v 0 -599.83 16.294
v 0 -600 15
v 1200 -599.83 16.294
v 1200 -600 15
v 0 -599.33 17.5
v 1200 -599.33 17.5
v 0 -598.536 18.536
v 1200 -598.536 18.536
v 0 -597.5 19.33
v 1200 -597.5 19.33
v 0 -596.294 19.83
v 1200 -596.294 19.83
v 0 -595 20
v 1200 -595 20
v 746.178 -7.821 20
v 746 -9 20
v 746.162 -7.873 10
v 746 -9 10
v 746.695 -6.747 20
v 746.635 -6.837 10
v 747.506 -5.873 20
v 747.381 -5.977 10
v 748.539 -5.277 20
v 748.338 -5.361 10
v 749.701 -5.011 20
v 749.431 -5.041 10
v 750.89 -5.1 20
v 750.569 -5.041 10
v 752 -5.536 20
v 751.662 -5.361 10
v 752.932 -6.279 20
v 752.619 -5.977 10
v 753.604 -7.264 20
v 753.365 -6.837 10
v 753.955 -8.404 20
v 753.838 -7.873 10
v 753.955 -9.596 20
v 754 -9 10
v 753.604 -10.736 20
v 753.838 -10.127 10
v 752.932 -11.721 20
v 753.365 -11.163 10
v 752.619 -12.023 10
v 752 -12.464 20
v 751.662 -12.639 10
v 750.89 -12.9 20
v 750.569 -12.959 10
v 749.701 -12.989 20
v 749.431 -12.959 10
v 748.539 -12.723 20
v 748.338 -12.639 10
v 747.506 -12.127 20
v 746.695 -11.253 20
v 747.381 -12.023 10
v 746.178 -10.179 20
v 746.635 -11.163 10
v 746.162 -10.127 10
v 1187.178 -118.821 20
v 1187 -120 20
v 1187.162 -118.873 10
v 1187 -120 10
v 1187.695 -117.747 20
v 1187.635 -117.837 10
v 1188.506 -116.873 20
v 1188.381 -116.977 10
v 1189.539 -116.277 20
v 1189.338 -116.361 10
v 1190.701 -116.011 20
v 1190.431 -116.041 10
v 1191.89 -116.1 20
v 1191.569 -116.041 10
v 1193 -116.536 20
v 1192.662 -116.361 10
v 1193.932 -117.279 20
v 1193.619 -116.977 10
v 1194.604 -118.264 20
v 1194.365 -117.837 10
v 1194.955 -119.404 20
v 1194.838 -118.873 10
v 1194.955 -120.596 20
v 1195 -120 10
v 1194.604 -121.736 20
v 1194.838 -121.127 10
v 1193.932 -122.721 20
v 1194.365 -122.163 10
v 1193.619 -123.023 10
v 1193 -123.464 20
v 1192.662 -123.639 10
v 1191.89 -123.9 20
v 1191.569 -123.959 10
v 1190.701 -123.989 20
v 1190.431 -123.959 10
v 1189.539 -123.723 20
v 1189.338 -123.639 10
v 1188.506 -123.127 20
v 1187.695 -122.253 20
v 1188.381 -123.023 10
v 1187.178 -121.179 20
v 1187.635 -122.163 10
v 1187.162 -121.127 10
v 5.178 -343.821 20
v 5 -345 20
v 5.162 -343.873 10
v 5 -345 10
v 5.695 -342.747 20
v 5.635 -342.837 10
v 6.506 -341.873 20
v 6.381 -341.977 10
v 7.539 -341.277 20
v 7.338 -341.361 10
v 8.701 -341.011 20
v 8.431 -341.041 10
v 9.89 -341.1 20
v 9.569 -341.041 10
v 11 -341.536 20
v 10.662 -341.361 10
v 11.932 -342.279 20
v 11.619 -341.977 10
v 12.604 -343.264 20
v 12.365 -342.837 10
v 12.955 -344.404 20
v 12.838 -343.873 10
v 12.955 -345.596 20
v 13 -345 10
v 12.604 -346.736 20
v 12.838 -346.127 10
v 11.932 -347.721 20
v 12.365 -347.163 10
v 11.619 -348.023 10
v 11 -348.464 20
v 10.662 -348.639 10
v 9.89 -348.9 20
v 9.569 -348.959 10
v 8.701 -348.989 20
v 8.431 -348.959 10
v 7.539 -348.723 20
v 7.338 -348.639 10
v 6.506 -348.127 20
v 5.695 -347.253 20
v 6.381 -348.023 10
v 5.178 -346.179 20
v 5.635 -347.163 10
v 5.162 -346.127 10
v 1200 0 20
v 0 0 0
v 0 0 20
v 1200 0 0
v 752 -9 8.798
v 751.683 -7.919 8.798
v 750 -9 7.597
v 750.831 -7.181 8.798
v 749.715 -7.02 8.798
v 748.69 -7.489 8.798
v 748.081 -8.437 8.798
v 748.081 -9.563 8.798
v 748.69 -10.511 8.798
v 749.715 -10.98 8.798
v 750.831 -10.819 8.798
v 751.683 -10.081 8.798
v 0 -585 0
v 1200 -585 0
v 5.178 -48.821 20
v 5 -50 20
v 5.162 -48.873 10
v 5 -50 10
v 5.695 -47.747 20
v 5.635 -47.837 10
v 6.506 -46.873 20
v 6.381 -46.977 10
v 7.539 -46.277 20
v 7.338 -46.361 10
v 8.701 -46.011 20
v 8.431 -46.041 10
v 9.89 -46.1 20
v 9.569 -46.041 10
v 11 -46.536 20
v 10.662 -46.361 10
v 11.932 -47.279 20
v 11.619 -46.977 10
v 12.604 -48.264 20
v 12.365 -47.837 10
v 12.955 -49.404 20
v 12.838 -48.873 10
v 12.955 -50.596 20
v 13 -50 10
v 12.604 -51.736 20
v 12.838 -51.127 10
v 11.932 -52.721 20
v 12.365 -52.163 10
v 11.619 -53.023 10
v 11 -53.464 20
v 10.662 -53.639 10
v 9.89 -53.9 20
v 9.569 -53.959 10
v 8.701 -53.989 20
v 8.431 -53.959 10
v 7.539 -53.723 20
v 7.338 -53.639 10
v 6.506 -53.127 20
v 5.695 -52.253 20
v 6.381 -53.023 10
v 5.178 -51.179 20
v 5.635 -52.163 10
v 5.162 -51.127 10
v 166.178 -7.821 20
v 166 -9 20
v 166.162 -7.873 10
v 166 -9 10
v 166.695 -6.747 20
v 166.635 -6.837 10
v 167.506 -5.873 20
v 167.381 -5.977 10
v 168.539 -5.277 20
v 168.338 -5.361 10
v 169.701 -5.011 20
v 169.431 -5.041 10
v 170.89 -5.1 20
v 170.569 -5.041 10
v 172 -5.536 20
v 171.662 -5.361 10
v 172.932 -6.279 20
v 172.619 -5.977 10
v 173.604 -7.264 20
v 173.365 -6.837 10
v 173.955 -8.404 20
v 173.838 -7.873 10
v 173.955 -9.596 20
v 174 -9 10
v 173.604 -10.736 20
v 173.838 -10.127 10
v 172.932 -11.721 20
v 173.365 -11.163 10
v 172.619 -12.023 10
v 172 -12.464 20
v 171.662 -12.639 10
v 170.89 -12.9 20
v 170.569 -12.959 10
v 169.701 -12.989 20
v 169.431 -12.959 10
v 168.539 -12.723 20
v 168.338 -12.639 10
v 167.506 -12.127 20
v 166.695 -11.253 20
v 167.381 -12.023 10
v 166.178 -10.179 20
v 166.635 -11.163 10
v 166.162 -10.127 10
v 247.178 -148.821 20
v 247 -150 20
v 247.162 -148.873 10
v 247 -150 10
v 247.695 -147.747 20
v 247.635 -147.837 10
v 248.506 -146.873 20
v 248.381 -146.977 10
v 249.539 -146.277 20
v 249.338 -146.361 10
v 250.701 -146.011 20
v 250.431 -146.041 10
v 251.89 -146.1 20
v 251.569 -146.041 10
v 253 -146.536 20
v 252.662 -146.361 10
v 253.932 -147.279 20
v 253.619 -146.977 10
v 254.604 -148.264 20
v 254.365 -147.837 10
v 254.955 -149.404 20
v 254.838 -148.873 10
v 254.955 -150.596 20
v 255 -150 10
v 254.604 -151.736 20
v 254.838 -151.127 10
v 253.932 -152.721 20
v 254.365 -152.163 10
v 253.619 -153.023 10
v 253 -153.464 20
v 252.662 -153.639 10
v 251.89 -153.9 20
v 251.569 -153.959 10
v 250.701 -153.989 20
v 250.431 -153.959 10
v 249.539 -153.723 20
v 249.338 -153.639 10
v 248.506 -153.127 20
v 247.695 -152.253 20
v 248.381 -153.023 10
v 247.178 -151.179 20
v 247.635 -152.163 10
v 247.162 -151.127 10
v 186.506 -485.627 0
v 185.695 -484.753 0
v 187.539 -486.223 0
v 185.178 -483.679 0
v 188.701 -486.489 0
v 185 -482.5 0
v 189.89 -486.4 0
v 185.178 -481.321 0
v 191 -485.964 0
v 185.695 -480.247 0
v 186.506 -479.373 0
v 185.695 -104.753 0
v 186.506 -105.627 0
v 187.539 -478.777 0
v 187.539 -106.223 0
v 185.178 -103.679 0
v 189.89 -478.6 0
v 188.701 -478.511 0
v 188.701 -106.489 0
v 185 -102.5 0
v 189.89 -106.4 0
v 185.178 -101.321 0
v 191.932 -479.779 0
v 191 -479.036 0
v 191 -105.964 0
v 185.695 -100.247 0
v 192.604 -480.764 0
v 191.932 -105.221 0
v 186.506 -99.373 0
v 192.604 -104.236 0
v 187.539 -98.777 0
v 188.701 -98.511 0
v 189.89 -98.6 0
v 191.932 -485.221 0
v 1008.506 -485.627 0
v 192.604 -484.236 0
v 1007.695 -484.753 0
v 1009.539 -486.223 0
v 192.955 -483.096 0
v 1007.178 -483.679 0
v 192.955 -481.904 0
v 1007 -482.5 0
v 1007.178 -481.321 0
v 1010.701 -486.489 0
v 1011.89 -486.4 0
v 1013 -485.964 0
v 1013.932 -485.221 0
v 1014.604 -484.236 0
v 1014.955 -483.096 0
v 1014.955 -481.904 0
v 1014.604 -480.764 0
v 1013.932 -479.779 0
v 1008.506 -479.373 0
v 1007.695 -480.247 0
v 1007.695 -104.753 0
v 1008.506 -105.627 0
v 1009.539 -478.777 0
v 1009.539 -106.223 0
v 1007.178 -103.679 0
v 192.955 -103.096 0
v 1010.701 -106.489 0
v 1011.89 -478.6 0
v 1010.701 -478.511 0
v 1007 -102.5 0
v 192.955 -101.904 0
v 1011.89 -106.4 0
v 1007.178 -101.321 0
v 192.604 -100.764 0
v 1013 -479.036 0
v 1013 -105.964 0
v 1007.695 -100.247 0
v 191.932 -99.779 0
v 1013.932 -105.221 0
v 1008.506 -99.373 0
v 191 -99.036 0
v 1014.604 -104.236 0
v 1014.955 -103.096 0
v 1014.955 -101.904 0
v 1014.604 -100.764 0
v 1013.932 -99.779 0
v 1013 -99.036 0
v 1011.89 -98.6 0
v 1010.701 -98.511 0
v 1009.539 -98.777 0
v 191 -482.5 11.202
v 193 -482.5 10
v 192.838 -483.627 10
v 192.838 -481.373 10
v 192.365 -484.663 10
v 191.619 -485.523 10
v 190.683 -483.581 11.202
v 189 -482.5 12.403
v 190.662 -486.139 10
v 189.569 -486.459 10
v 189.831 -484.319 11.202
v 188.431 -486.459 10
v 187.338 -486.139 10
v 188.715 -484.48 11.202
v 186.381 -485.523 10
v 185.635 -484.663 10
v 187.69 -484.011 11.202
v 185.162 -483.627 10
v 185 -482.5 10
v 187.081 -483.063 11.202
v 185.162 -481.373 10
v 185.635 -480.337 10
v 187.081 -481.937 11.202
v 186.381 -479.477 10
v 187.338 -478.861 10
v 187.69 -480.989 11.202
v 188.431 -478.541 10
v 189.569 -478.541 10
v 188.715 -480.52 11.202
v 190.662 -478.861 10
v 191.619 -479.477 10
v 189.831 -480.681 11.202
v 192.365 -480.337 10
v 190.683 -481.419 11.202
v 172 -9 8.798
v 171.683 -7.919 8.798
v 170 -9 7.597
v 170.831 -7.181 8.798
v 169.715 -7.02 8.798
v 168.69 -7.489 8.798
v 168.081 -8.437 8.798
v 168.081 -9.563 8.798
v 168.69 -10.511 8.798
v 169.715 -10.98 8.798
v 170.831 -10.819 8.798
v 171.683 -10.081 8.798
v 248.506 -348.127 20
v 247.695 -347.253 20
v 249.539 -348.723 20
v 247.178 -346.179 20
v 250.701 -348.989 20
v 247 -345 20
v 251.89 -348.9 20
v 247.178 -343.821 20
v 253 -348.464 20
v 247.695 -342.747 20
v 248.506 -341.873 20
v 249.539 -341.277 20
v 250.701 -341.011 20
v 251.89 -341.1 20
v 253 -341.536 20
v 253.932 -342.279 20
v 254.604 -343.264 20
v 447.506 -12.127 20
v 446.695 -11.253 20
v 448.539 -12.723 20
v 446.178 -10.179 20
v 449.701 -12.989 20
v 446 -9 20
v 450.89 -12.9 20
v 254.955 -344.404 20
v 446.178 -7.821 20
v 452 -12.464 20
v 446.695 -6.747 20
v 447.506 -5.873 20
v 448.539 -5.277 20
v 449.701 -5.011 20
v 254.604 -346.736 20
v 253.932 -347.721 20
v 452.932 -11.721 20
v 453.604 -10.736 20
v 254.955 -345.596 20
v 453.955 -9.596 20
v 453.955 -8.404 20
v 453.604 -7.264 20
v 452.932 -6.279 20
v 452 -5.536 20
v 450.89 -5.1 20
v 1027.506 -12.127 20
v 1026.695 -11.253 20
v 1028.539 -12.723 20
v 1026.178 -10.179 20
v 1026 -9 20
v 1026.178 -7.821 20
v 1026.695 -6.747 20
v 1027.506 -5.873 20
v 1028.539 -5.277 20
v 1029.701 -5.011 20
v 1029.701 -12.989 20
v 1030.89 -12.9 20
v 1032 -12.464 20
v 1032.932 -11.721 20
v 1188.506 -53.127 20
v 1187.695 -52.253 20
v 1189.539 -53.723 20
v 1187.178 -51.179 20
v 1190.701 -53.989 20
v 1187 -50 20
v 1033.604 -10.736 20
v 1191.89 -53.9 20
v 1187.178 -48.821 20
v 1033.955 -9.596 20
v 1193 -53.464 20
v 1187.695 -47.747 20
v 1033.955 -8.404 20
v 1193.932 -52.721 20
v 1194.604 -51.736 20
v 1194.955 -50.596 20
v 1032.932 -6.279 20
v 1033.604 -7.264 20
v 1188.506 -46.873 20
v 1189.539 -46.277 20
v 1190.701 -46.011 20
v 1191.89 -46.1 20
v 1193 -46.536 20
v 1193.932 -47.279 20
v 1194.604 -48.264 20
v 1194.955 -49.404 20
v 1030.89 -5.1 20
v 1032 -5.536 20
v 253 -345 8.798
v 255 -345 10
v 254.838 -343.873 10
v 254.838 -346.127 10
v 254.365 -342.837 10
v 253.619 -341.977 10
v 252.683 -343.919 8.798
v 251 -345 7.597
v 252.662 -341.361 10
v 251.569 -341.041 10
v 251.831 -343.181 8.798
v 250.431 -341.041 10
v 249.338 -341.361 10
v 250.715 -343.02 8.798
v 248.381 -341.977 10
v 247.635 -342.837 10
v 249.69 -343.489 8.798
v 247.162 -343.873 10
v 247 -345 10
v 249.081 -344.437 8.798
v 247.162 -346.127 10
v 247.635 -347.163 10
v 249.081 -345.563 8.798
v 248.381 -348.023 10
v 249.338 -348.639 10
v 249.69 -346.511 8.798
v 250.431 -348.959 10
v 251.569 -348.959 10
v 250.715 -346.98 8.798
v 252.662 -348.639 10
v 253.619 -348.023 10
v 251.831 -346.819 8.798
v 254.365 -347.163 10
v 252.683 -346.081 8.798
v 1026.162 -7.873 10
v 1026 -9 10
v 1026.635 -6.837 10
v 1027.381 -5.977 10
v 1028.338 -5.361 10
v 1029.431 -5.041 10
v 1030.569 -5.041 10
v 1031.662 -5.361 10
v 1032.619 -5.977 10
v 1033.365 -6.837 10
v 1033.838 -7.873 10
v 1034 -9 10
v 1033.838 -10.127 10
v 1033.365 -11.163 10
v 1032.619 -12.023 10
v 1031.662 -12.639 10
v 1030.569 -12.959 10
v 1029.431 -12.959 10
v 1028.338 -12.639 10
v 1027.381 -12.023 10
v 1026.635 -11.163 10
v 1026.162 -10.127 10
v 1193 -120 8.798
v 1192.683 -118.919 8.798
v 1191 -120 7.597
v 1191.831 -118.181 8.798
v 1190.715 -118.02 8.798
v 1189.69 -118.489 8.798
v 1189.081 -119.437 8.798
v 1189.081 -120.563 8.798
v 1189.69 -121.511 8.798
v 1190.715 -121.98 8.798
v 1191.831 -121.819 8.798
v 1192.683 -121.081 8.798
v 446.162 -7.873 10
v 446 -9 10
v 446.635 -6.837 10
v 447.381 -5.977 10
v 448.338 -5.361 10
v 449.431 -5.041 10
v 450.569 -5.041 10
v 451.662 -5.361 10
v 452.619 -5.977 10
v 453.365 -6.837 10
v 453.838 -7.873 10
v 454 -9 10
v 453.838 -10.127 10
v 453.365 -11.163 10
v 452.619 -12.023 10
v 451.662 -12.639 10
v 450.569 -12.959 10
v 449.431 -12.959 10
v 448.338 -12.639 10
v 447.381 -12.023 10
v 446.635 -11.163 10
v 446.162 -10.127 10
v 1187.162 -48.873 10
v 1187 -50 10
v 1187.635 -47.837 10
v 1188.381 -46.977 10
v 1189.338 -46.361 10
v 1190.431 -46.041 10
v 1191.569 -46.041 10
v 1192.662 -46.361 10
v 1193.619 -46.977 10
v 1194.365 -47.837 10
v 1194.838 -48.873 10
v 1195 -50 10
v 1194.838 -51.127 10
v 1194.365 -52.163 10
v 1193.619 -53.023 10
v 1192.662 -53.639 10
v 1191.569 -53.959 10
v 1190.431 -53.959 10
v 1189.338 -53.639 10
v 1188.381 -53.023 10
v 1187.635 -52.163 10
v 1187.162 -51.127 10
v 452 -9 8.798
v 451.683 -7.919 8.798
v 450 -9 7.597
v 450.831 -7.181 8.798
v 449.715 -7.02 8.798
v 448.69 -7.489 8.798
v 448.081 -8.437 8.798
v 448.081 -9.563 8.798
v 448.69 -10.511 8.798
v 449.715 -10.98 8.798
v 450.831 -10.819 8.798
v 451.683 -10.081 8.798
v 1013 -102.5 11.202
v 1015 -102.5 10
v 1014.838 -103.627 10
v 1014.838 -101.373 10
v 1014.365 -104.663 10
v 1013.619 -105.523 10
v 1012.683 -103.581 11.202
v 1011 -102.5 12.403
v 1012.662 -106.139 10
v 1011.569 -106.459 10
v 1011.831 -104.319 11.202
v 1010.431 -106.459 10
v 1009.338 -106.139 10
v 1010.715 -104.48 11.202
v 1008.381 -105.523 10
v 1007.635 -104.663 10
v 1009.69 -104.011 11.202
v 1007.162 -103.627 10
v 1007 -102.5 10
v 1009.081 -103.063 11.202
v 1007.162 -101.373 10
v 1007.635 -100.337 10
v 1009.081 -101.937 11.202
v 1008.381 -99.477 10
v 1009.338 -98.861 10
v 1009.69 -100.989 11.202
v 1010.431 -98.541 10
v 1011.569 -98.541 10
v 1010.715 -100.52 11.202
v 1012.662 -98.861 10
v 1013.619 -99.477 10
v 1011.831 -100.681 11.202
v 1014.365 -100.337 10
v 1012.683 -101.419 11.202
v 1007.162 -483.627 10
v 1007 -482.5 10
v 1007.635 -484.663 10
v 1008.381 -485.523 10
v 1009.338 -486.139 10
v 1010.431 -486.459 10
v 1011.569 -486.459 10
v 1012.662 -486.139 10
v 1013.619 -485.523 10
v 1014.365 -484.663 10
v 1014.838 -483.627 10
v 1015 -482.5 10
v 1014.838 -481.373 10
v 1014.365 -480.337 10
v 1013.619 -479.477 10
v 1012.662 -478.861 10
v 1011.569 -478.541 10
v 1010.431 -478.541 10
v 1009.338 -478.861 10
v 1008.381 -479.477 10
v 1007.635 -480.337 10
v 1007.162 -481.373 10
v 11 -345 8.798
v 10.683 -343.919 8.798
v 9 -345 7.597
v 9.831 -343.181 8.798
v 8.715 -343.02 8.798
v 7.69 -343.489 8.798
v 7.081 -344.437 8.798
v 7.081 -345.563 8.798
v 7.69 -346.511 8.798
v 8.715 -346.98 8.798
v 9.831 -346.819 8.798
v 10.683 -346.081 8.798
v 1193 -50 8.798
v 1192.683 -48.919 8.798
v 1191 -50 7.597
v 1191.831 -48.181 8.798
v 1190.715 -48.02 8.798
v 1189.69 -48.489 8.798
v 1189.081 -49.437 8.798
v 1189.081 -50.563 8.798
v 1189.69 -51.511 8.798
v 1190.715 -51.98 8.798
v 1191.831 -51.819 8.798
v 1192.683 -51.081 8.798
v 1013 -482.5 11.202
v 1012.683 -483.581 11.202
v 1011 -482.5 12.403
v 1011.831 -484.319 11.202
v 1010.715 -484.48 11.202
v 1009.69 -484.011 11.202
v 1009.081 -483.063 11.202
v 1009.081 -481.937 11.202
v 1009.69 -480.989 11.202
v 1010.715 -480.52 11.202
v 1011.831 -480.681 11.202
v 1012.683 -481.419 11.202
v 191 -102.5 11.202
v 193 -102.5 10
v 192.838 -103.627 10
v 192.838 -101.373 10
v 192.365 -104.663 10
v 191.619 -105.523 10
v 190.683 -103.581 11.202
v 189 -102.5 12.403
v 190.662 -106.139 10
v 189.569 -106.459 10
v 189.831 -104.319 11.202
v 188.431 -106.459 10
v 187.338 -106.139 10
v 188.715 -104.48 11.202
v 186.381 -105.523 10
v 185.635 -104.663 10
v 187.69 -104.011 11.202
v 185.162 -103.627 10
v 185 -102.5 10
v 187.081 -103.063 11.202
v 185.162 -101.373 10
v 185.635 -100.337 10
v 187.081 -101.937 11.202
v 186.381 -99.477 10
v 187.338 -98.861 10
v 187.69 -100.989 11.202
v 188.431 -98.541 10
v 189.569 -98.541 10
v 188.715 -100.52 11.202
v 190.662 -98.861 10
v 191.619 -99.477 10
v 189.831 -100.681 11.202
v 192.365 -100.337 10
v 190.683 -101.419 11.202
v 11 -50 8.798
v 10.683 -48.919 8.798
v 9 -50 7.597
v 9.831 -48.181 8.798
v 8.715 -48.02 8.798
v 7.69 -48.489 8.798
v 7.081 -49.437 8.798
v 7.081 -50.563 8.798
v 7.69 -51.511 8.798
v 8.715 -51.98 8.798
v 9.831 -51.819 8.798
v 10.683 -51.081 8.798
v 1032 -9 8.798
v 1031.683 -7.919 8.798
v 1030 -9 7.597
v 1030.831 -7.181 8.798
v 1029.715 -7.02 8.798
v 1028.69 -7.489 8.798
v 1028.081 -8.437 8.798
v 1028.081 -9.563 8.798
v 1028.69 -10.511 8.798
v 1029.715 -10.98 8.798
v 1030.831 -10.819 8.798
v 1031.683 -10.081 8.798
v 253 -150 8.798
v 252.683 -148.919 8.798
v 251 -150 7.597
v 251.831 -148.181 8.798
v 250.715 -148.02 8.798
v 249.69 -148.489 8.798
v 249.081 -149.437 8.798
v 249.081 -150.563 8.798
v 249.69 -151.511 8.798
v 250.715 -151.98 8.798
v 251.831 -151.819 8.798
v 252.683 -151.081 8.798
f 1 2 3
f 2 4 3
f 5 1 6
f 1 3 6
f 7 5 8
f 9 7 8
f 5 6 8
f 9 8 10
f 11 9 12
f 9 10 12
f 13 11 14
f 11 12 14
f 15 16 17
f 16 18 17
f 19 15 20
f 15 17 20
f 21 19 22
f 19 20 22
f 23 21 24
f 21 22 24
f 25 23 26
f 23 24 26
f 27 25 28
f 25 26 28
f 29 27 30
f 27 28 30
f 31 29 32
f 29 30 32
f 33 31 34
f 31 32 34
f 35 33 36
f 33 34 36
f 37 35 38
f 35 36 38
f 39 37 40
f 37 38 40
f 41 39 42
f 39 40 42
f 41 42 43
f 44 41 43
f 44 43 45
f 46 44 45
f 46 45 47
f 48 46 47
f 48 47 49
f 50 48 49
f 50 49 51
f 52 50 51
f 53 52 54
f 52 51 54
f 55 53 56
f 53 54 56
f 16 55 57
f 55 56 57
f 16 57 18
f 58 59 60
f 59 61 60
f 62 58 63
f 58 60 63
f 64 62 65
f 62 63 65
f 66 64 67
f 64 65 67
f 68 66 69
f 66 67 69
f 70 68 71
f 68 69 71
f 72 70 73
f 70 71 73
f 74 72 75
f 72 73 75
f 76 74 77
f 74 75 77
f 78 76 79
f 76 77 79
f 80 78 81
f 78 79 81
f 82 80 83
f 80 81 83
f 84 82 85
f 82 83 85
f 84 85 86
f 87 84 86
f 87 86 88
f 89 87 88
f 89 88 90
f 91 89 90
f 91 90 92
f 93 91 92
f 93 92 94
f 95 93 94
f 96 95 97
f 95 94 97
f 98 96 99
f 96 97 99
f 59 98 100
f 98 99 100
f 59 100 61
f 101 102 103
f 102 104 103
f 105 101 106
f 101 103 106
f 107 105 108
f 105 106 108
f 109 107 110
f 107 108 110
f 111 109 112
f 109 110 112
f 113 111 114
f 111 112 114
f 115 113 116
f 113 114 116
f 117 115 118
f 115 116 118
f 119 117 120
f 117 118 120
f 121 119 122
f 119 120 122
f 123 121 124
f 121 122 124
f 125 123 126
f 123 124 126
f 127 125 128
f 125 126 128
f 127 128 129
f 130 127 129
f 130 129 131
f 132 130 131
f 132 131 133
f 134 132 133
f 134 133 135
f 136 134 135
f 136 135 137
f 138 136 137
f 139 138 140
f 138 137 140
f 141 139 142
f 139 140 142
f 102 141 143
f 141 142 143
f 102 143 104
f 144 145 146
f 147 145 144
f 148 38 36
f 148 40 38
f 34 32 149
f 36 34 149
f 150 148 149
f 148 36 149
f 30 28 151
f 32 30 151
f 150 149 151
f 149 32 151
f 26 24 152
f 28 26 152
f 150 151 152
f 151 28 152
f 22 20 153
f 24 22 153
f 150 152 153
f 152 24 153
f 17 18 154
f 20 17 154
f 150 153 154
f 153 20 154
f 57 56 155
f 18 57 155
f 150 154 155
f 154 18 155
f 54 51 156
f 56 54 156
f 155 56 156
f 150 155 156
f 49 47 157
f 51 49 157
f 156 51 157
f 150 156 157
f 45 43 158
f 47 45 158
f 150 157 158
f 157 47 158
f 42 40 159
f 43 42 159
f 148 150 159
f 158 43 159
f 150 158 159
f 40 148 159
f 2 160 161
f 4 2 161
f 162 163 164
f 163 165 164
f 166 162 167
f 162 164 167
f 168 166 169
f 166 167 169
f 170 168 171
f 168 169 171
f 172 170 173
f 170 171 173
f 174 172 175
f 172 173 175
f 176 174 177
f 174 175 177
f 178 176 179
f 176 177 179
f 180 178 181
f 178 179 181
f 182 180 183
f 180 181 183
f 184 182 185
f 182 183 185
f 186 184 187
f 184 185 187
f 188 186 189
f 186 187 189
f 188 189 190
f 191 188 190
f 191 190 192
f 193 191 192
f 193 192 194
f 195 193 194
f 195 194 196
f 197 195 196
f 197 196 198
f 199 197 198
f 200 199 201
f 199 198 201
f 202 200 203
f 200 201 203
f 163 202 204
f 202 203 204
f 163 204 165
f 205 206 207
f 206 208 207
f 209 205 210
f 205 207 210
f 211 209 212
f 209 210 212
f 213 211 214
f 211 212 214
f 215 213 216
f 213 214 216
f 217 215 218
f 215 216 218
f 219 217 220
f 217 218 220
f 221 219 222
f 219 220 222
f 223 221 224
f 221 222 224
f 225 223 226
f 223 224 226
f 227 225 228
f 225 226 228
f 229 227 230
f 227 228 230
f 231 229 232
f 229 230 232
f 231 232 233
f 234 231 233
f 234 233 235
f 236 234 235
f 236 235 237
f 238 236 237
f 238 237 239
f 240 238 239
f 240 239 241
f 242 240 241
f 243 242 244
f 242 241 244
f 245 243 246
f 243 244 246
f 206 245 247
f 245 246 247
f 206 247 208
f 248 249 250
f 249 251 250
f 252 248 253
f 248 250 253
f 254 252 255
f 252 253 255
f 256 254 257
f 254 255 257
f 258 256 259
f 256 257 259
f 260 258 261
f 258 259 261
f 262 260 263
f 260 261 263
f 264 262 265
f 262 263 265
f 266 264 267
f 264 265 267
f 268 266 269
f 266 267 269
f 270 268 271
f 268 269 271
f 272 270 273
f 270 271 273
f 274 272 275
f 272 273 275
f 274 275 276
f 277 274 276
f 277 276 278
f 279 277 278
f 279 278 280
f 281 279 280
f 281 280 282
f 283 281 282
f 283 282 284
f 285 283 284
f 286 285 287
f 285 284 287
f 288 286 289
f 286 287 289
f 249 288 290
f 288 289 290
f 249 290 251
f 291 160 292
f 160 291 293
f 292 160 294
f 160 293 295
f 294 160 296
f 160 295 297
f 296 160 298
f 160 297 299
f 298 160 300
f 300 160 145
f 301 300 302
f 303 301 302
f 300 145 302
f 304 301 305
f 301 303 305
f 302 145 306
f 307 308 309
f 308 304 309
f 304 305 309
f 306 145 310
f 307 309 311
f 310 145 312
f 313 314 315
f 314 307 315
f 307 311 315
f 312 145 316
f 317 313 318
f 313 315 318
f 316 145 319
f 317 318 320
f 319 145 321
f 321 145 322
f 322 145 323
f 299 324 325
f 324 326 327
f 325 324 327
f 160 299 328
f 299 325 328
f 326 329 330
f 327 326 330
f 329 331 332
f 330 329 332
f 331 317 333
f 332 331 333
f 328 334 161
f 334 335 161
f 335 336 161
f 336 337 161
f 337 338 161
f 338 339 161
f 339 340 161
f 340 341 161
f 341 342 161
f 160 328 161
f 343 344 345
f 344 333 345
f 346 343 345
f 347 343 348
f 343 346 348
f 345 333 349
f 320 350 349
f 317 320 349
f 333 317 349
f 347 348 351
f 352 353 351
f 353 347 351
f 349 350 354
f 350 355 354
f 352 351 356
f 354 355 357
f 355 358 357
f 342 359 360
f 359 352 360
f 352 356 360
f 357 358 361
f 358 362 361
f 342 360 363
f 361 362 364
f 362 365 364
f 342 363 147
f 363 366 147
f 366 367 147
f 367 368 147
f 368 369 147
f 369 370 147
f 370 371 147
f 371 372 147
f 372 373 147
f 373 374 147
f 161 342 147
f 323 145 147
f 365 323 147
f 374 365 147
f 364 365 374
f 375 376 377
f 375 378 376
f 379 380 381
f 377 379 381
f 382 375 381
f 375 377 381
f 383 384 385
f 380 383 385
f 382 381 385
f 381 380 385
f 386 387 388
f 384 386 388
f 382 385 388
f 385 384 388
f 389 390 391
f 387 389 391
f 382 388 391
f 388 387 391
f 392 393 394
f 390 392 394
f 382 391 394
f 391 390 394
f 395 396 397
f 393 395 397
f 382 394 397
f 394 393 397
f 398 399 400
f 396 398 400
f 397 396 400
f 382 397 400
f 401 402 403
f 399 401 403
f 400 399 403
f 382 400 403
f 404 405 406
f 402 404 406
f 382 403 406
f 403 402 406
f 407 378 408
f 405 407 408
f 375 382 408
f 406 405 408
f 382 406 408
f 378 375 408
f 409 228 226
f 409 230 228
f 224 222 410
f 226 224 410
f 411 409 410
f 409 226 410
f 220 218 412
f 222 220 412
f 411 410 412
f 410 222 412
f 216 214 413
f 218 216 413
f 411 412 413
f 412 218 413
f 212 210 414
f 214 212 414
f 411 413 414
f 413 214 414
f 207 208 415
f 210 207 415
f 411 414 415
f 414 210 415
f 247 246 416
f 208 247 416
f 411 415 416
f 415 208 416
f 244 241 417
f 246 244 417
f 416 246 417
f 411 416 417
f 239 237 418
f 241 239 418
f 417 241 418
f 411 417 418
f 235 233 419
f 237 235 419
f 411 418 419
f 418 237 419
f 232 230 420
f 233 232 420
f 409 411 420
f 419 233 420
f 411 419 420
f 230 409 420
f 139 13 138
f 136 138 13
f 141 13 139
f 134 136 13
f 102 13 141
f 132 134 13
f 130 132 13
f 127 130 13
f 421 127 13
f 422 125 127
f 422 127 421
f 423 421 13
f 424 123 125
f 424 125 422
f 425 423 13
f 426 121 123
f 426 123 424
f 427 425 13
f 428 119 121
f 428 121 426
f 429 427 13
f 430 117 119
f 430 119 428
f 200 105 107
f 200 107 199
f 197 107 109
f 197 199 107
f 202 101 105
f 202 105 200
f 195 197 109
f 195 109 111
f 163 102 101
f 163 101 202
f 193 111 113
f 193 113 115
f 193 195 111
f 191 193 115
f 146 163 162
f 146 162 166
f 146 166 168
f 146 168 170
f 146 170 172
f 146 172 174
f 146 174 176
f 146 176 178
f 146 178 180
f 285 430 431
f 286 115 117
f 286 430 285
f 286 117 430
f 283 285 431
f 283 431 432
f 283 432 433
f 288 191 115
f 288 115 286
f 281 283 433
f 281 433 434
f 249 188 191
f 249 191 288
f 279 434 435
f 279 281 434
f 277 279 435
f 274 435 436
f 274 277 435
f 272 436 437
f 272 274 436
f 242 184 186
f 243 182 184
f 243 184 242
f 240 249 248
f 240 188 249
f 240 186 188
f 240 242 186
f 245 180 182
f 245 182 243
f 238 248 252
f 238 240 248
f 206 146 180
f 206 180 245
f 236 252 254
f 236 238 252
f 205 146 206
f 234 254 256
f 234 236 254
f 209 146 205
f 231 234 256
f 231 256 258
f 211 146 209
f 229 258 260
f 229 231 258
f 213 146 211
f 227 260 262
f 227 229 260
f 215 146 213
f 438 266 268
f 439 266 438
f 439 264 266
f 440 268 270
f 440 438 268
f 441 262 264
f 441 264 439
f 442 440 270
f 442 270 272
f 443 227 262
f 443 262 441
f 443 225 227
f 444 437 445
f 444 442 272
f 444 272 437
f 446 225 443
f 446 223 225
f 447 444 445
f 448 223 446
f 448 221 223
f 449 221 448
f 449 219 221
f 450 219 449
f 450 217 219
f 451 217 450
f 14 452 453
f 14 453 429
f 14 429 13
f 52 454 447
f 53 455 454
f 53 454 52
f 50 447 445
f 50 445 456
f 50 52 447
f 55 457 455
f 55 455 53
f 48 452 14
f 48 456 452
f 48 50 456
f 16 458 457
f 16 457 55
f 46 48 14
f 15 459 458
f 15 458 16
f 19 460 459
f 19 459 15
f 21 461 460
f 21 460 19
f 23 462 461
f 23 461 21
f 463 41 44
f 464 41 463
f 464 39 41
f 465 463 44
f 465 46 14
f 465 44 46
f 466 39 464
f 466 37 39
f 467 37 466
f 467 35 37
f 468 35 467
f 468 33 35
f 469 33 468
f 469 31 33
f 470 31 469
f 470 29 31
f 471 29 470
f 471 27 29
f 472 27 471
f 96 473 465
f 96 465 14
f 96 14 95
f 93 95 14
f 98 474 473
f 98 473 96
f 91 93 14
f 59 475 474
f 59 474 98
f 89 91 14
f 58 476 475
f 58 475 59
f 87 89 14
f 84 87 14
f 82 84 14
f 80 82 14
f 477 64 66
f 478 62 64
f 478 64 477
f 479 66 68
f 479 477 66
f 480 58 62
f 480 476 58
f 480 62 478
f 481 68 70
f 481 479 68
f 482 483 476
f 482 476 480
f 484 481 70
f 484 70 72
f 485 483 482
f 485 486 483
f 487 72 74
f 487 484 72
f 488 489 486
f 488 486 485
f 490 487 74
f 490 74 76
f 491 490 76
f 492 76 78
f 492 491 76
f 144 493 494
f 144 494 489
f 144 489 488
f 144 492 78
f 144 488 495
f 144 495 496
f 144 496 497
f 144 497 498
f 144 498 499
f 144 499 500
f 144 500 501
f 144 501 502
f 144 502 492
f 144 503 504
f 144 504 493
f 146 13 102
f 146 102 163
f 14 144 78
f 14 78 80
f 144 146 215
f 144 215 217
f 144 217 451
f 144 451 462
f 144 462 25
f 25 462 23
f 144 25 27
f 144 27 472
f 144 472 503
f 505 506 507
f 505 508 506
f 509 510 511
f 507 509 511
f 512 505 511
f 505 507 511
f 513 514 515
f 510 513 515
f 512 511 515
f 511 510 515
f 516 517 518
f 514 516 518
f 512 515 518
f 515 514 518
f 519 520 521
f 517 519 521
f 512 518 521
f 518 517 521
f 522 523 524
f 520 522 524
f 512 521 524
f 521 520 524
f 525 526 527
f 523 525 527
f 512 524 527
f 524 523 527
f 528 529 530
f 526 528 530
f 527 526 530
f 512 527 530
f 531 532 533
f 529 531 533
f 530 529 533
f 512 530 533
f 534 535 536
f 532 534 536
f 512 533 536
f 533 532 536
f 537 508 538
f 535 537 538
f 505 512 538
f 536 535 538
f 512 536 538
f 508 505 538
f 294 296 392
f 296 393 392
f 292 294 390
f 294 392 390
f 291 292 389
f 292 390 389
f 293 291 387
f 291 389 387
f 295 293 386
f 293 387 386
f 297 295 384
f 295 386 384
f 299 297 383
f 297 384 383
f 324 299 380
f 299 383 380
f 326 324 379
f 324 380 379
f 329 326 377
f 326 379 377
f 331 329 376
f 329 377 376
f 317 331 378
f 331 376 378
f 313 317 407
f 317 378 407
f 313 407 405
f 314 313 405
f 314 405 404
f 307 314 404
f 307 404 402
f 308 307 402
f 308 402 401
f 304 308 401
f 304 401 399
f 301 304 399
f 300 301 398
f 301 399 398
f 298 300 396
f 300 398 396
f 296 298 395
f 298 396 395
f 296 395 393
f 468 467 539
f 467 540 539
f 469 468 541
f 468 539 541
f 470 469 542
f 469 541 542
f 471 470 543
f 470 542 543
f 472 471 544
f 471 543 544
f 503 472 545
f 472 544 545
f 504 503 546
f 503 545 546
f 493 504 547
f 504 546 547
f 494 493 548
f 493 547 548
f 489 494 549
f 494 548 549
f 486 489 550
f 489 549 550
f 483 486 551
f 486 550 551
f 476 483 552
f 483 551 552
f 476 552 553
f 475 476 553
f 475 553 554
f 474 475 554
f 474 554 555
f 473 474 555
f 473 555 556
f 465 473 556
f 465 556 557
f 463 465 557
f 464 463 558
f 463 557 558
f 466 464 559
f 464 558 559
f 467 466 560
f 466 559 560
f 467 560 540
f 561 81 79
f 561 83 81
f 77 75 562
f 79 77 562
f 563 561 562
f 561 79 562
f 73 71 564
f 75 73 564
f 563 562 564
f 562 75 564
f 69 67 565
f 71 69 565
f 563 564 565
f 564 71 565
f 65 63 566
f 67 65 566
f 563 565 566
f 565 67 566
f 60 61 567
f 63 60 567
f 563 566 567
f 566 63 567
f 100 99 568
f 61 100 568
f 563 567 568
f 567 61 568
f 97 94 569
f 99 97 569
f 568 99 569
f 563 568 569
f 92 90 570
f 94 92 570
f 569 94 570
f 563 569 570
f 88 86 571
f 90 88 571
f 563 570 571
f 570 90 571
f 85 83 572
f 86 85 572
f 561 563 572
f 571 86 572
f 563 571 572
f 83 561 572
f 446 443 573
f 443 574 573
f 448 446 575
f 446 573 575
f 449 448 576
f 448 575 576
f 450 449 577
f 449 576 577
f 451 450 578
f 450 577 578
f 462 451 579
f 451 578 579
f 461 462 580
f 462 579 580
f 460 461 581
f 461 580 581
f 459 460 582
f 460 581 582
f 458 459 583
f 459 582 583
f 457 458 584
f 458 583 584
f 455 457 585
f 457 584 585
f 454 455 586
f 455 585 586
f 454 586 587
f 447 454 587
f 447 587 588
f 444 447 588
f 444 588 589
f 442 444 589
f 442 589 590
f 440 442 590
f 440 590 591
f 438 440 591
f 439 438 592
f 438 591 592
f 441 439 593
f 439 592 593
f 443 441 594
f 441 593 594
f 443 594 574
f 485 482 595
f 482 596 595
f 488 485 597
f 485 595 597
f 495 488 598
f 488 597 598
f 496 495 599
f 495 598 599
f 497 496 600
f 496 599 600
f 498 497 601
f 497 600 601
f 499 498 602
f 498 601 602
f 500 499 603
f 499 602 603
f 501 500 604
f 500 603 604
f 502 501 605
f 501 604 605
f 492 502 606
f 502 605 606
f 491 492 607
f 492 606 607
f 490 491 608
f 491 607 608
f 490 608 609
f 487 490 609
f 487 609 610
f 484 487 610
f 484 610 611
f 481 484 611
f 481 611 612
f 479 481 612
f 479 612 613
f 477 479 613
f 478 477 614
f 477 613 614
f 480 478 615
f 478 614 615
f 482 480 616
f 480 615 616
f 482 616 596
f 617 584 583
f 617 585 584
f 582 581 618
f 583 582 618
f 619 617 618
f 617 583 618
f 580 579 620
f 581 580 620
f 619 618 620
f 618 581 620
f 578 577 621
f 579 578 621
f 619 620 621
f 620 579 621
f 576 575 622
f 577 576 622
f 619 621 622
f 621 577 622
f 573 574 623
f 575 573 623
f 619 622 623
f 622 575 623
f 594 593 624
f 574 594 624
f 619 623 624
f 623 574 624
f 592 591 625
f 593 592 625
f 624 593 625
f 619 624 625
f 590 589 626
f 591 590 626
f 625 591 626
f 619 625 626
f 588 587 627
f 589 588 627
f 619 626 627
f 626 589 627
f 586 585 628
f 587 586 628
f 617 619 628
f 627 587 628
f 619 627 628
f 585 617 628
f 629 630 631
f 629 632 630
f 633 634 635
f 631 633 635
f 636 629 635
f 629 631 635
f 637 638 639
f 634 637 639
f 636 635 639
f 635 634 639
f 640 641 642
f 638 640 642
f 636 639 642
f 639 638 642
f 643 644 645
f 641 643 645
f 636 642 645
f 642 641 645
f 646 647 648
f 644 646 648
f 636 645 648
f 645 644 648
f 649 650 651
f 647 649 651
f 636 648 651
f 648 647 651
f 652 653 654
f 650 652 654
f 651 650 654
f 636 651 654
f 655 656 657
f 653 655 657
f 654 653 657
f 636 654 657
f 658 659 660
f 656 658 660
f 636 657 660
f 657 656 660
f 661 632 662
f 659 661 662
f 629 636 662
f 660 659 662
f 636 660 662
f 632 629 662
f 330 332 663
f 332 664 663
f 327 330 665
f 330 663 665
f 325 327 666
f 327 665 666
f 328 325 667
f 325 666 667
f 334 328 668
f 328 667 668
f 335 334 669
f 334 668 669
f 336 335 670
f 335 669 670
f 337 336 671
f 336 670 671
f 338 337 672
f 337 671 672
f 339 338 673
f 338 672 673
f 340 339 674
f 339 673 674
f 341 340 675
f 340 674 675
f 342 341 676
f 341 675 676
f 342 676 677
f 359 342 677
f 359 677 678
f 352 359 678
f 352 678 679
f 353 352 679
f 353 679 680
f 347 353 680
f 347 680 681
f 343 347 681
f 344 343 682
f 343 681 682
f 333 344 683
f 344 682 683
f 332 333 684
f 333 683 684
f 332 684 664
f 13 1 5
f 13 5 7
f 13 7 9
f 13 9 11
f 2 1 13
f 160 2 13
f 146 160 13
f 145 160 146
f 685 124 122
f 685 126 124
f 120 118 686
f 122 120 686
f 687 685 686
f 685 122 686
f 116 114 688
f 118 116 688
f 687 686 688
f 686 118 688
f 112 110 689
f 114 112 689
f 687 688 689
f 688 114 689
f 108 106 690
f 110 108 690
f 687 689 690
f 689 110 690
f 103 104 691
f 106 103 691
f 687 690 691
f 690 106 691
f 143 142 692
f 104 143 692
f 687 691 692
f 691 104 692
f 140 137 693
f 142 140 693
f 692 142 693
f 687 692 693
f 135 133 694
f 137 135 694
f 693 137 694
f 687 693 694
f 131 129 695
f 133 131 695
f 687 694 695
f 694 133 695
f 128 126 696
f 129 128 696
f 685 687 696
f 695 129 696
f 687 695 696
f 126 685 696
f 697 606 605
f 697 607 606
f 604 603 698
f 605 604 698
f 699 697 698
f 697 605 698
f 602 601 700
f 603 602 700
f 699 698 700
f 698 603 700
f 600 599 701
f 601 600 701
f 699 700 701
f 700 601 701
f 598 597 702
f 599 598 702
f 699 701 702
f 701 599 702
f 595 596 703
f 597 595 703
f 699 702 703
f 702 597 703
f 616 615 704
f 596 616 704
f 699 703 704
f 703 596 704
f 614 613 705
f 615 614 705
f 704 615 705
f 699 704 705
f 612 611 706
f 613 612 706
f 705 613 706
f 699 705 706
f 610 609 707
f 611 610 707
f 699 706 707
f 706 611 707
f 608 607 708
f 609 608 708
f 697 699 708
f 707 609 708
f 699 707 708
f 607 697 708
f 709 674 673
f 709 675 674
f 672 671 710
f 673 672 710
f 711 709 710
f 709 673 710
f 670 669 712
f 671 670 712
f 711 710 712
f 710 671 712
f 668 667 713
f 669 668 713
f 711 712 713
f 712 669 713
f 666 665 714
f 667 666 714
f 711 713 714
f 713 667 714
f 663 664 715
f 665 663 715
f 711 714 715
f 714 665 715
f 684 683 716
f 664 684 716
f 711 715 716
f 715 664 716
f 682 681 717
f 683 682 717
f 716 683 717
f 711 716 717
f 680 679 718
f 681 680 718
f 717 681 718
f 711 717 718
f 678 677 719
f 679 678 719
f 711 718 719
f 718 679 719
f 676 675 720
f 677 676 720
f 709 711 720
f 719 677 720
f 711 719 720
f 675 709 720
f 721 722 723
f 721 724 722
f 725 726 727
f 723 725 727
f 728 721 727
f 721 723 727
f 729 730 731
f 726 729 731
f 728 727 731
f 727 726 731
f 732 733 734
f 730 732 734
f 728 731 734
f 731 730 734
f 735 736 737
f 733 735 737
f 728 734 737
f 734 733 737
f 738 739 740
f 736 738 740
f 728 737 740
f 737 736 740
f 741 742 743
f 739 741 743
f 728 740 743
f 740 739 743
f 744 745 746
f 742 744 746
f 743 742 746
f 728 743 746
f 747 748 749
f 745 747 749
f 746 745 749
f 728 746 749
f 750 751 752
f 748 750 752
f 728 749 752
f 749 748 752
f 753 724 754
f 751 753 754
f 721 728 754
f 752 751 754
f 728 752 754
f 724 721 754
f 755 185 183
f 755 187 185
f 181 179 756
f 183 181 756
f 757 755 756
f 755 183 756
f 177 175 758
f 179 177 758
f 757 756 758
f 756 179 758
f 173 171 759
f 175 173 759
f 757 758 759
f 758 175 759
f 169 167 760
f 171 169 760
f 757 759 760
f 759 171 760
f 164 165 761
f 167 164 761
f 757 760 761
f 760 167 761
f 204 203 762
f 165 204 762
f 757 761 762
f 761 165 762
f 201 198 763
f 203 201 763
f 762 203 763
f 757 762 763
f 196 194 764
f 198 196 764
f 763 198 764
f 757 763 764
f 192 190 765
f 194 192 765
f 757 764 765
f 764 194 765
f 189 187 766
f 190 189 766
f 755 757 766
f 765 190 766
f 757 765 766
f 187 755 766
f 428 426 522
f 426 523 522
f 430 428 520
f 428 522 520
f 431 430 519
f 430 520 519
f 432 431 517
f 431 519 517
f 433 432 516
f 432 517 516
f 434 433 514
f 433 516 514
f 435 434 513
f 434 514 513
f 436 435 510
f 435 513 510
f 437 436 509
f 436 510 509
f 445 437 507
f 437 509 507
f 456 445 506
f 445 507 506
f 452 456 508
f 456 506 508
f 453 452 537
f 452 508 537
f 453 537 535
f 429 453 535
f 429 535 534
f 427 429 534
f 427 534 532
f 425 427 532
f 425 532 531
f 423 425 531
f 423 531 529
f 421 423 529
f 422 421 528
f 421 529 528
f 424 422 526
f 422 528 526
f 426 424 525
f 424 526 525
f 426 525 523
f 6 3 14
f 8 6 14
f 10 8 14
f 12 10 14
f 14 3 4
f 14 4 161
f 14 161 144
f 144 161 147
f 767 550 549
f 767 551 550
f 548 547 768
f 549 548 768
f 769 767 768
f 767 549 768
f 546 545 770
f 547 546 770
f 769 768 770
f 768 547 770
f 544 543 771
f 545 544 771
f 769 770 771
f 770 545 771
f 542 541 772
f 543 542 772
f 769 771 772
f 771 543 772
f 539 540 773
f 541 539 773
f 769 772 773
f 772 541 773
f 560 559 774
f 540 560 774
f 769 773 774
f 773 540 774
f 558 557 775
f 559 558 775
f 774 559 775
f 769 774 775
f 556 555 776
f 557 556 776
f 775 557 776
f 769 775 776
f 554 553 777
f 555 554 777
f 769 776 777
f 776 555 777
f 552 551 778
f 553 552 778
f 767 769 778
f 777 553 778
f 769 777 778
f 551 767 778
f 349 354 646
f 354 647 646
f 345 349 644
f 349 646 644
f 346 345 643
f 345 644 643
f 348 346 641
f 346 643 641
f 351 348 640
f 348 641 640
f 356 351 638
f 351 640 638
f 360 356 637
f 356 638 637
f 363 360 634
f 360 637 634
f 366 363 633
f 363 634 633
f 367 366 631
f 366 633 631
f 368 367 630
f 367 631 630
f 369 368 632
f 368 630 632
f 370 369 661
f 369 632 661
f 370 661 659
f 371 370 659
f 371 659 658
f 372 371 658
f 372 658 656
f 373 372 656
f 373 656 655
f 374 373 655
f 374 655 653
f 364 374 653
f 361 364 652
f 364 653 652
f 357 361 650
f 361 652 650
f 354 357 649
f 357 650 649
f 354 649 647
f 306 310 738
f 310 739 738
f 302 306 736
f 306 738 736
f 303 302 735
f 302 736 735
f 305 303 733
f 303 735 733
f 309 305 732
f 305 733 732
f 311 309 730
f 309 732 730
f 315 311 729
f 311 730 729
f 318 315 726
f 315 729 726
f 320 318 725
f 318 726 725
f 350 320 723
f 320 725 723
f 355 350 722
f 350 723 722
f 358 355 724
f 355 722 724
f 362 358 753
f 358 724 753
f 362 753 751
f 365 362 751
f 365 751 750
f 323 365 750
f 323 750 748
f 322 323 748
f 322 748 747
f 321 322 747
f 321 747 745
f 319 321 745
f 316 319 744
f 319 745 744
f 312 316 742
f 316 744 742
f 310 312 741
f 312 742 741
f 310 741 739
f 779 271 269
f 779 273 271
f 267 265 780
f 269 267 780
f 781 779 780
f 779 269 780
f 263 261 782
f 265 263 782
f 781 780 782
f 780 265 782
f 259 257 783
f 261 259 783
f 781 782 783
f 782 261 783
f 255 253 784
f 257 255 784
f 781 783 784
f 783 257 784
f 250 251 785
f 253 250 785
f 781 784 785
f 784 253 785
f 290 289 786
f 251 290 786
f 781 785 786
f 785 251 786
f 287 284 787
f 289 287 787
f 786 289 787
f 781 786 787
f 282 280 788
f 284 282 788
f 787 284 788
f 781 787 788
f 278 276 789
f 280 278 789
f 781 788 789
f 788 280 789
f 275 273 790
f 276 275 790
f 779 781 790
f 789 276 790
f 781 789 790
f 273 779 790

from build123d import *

# Parameters (mm, degrees)
F0_W           = 1200
F0_H           = 600
F1_DEPTH       = 20
F2_R           = 5
F3_SIZE        = 14.99999
F6_D           = 8
F6_DEPTH       = 10
F6_TIP         = 2.4034424761
F6_ON_F5_D     = 8
F6_ON_F5_DEPTH = 10
F6_ON_F5_TIP   = 2.4034424761


# Not quite as in the source:
# - a fillet or chamfer is up to 0.001 mm smaller than in the source, because OpenCascade refuses the exact size


with BuildPart() as f1:
    # F0 (on Top) → F1 (new body)
    with BuildSketch(Plane.XY):
        with Locations((600, -300)):
            Rectangle(F0_W, F0_H)
    extrude(amount=F1_DEPTH)

    # F2
    f2_edges = [f1.edges().sort_by_distance(p)[0] for p in [
        (600, -600, 20),
    ]]
    fillet(f2_edges, radius=F2_R)

    # F3 (size 15 in the source; OpenCascade refuses exactly that, so slightly less here)
    f3_edges = [f1.edges().sort_by_distance(p)[0] for p in [
        (600, -600, 0),
    ]]
    chamfer(f3_edges, length=F3_SIZE)

    # F6
    with Locations(Plane.XY.offset(20)):
        with Locations((1030, -9), (750, -9), (450, -9), (170, -9), (9, -50), (9, -345), (251, -150), (251, -345), (1191, -120), (1191, -50)):
            Hole(F6_D / 2, depth=F6_DEPTH)
            with Locations((0, 0, -(F6_DEPTH + F6_TIP / 2))):  # 118° drill point
                Cone(0, F6_D / 2, F6_TIP, mode=Mode.SUBTRACT)

    # F6 on F5
    with Locations(Plane(origin=(0, 0, 0), x_dir=(1, 0, 0), z_dir=(0, 0, -1))):
        with Locations((189, 482.5), (189, 102.5), (1011, 102.5), (1011, 482.5)):
            Hole(F6_ON_F5_D / 2, depth=F6_ON_F5_DEPTH)
            with Locations((0, 0, -(F6_ON_F5_DEPTH + F6_ON_F5_TIP / 2))):  # 118° drill point
                Cone(0, F6_ON_F5_D / 2, F6_ON_F5_TIP, mode=Mode.SUBTRACT)


solid = f1.part
